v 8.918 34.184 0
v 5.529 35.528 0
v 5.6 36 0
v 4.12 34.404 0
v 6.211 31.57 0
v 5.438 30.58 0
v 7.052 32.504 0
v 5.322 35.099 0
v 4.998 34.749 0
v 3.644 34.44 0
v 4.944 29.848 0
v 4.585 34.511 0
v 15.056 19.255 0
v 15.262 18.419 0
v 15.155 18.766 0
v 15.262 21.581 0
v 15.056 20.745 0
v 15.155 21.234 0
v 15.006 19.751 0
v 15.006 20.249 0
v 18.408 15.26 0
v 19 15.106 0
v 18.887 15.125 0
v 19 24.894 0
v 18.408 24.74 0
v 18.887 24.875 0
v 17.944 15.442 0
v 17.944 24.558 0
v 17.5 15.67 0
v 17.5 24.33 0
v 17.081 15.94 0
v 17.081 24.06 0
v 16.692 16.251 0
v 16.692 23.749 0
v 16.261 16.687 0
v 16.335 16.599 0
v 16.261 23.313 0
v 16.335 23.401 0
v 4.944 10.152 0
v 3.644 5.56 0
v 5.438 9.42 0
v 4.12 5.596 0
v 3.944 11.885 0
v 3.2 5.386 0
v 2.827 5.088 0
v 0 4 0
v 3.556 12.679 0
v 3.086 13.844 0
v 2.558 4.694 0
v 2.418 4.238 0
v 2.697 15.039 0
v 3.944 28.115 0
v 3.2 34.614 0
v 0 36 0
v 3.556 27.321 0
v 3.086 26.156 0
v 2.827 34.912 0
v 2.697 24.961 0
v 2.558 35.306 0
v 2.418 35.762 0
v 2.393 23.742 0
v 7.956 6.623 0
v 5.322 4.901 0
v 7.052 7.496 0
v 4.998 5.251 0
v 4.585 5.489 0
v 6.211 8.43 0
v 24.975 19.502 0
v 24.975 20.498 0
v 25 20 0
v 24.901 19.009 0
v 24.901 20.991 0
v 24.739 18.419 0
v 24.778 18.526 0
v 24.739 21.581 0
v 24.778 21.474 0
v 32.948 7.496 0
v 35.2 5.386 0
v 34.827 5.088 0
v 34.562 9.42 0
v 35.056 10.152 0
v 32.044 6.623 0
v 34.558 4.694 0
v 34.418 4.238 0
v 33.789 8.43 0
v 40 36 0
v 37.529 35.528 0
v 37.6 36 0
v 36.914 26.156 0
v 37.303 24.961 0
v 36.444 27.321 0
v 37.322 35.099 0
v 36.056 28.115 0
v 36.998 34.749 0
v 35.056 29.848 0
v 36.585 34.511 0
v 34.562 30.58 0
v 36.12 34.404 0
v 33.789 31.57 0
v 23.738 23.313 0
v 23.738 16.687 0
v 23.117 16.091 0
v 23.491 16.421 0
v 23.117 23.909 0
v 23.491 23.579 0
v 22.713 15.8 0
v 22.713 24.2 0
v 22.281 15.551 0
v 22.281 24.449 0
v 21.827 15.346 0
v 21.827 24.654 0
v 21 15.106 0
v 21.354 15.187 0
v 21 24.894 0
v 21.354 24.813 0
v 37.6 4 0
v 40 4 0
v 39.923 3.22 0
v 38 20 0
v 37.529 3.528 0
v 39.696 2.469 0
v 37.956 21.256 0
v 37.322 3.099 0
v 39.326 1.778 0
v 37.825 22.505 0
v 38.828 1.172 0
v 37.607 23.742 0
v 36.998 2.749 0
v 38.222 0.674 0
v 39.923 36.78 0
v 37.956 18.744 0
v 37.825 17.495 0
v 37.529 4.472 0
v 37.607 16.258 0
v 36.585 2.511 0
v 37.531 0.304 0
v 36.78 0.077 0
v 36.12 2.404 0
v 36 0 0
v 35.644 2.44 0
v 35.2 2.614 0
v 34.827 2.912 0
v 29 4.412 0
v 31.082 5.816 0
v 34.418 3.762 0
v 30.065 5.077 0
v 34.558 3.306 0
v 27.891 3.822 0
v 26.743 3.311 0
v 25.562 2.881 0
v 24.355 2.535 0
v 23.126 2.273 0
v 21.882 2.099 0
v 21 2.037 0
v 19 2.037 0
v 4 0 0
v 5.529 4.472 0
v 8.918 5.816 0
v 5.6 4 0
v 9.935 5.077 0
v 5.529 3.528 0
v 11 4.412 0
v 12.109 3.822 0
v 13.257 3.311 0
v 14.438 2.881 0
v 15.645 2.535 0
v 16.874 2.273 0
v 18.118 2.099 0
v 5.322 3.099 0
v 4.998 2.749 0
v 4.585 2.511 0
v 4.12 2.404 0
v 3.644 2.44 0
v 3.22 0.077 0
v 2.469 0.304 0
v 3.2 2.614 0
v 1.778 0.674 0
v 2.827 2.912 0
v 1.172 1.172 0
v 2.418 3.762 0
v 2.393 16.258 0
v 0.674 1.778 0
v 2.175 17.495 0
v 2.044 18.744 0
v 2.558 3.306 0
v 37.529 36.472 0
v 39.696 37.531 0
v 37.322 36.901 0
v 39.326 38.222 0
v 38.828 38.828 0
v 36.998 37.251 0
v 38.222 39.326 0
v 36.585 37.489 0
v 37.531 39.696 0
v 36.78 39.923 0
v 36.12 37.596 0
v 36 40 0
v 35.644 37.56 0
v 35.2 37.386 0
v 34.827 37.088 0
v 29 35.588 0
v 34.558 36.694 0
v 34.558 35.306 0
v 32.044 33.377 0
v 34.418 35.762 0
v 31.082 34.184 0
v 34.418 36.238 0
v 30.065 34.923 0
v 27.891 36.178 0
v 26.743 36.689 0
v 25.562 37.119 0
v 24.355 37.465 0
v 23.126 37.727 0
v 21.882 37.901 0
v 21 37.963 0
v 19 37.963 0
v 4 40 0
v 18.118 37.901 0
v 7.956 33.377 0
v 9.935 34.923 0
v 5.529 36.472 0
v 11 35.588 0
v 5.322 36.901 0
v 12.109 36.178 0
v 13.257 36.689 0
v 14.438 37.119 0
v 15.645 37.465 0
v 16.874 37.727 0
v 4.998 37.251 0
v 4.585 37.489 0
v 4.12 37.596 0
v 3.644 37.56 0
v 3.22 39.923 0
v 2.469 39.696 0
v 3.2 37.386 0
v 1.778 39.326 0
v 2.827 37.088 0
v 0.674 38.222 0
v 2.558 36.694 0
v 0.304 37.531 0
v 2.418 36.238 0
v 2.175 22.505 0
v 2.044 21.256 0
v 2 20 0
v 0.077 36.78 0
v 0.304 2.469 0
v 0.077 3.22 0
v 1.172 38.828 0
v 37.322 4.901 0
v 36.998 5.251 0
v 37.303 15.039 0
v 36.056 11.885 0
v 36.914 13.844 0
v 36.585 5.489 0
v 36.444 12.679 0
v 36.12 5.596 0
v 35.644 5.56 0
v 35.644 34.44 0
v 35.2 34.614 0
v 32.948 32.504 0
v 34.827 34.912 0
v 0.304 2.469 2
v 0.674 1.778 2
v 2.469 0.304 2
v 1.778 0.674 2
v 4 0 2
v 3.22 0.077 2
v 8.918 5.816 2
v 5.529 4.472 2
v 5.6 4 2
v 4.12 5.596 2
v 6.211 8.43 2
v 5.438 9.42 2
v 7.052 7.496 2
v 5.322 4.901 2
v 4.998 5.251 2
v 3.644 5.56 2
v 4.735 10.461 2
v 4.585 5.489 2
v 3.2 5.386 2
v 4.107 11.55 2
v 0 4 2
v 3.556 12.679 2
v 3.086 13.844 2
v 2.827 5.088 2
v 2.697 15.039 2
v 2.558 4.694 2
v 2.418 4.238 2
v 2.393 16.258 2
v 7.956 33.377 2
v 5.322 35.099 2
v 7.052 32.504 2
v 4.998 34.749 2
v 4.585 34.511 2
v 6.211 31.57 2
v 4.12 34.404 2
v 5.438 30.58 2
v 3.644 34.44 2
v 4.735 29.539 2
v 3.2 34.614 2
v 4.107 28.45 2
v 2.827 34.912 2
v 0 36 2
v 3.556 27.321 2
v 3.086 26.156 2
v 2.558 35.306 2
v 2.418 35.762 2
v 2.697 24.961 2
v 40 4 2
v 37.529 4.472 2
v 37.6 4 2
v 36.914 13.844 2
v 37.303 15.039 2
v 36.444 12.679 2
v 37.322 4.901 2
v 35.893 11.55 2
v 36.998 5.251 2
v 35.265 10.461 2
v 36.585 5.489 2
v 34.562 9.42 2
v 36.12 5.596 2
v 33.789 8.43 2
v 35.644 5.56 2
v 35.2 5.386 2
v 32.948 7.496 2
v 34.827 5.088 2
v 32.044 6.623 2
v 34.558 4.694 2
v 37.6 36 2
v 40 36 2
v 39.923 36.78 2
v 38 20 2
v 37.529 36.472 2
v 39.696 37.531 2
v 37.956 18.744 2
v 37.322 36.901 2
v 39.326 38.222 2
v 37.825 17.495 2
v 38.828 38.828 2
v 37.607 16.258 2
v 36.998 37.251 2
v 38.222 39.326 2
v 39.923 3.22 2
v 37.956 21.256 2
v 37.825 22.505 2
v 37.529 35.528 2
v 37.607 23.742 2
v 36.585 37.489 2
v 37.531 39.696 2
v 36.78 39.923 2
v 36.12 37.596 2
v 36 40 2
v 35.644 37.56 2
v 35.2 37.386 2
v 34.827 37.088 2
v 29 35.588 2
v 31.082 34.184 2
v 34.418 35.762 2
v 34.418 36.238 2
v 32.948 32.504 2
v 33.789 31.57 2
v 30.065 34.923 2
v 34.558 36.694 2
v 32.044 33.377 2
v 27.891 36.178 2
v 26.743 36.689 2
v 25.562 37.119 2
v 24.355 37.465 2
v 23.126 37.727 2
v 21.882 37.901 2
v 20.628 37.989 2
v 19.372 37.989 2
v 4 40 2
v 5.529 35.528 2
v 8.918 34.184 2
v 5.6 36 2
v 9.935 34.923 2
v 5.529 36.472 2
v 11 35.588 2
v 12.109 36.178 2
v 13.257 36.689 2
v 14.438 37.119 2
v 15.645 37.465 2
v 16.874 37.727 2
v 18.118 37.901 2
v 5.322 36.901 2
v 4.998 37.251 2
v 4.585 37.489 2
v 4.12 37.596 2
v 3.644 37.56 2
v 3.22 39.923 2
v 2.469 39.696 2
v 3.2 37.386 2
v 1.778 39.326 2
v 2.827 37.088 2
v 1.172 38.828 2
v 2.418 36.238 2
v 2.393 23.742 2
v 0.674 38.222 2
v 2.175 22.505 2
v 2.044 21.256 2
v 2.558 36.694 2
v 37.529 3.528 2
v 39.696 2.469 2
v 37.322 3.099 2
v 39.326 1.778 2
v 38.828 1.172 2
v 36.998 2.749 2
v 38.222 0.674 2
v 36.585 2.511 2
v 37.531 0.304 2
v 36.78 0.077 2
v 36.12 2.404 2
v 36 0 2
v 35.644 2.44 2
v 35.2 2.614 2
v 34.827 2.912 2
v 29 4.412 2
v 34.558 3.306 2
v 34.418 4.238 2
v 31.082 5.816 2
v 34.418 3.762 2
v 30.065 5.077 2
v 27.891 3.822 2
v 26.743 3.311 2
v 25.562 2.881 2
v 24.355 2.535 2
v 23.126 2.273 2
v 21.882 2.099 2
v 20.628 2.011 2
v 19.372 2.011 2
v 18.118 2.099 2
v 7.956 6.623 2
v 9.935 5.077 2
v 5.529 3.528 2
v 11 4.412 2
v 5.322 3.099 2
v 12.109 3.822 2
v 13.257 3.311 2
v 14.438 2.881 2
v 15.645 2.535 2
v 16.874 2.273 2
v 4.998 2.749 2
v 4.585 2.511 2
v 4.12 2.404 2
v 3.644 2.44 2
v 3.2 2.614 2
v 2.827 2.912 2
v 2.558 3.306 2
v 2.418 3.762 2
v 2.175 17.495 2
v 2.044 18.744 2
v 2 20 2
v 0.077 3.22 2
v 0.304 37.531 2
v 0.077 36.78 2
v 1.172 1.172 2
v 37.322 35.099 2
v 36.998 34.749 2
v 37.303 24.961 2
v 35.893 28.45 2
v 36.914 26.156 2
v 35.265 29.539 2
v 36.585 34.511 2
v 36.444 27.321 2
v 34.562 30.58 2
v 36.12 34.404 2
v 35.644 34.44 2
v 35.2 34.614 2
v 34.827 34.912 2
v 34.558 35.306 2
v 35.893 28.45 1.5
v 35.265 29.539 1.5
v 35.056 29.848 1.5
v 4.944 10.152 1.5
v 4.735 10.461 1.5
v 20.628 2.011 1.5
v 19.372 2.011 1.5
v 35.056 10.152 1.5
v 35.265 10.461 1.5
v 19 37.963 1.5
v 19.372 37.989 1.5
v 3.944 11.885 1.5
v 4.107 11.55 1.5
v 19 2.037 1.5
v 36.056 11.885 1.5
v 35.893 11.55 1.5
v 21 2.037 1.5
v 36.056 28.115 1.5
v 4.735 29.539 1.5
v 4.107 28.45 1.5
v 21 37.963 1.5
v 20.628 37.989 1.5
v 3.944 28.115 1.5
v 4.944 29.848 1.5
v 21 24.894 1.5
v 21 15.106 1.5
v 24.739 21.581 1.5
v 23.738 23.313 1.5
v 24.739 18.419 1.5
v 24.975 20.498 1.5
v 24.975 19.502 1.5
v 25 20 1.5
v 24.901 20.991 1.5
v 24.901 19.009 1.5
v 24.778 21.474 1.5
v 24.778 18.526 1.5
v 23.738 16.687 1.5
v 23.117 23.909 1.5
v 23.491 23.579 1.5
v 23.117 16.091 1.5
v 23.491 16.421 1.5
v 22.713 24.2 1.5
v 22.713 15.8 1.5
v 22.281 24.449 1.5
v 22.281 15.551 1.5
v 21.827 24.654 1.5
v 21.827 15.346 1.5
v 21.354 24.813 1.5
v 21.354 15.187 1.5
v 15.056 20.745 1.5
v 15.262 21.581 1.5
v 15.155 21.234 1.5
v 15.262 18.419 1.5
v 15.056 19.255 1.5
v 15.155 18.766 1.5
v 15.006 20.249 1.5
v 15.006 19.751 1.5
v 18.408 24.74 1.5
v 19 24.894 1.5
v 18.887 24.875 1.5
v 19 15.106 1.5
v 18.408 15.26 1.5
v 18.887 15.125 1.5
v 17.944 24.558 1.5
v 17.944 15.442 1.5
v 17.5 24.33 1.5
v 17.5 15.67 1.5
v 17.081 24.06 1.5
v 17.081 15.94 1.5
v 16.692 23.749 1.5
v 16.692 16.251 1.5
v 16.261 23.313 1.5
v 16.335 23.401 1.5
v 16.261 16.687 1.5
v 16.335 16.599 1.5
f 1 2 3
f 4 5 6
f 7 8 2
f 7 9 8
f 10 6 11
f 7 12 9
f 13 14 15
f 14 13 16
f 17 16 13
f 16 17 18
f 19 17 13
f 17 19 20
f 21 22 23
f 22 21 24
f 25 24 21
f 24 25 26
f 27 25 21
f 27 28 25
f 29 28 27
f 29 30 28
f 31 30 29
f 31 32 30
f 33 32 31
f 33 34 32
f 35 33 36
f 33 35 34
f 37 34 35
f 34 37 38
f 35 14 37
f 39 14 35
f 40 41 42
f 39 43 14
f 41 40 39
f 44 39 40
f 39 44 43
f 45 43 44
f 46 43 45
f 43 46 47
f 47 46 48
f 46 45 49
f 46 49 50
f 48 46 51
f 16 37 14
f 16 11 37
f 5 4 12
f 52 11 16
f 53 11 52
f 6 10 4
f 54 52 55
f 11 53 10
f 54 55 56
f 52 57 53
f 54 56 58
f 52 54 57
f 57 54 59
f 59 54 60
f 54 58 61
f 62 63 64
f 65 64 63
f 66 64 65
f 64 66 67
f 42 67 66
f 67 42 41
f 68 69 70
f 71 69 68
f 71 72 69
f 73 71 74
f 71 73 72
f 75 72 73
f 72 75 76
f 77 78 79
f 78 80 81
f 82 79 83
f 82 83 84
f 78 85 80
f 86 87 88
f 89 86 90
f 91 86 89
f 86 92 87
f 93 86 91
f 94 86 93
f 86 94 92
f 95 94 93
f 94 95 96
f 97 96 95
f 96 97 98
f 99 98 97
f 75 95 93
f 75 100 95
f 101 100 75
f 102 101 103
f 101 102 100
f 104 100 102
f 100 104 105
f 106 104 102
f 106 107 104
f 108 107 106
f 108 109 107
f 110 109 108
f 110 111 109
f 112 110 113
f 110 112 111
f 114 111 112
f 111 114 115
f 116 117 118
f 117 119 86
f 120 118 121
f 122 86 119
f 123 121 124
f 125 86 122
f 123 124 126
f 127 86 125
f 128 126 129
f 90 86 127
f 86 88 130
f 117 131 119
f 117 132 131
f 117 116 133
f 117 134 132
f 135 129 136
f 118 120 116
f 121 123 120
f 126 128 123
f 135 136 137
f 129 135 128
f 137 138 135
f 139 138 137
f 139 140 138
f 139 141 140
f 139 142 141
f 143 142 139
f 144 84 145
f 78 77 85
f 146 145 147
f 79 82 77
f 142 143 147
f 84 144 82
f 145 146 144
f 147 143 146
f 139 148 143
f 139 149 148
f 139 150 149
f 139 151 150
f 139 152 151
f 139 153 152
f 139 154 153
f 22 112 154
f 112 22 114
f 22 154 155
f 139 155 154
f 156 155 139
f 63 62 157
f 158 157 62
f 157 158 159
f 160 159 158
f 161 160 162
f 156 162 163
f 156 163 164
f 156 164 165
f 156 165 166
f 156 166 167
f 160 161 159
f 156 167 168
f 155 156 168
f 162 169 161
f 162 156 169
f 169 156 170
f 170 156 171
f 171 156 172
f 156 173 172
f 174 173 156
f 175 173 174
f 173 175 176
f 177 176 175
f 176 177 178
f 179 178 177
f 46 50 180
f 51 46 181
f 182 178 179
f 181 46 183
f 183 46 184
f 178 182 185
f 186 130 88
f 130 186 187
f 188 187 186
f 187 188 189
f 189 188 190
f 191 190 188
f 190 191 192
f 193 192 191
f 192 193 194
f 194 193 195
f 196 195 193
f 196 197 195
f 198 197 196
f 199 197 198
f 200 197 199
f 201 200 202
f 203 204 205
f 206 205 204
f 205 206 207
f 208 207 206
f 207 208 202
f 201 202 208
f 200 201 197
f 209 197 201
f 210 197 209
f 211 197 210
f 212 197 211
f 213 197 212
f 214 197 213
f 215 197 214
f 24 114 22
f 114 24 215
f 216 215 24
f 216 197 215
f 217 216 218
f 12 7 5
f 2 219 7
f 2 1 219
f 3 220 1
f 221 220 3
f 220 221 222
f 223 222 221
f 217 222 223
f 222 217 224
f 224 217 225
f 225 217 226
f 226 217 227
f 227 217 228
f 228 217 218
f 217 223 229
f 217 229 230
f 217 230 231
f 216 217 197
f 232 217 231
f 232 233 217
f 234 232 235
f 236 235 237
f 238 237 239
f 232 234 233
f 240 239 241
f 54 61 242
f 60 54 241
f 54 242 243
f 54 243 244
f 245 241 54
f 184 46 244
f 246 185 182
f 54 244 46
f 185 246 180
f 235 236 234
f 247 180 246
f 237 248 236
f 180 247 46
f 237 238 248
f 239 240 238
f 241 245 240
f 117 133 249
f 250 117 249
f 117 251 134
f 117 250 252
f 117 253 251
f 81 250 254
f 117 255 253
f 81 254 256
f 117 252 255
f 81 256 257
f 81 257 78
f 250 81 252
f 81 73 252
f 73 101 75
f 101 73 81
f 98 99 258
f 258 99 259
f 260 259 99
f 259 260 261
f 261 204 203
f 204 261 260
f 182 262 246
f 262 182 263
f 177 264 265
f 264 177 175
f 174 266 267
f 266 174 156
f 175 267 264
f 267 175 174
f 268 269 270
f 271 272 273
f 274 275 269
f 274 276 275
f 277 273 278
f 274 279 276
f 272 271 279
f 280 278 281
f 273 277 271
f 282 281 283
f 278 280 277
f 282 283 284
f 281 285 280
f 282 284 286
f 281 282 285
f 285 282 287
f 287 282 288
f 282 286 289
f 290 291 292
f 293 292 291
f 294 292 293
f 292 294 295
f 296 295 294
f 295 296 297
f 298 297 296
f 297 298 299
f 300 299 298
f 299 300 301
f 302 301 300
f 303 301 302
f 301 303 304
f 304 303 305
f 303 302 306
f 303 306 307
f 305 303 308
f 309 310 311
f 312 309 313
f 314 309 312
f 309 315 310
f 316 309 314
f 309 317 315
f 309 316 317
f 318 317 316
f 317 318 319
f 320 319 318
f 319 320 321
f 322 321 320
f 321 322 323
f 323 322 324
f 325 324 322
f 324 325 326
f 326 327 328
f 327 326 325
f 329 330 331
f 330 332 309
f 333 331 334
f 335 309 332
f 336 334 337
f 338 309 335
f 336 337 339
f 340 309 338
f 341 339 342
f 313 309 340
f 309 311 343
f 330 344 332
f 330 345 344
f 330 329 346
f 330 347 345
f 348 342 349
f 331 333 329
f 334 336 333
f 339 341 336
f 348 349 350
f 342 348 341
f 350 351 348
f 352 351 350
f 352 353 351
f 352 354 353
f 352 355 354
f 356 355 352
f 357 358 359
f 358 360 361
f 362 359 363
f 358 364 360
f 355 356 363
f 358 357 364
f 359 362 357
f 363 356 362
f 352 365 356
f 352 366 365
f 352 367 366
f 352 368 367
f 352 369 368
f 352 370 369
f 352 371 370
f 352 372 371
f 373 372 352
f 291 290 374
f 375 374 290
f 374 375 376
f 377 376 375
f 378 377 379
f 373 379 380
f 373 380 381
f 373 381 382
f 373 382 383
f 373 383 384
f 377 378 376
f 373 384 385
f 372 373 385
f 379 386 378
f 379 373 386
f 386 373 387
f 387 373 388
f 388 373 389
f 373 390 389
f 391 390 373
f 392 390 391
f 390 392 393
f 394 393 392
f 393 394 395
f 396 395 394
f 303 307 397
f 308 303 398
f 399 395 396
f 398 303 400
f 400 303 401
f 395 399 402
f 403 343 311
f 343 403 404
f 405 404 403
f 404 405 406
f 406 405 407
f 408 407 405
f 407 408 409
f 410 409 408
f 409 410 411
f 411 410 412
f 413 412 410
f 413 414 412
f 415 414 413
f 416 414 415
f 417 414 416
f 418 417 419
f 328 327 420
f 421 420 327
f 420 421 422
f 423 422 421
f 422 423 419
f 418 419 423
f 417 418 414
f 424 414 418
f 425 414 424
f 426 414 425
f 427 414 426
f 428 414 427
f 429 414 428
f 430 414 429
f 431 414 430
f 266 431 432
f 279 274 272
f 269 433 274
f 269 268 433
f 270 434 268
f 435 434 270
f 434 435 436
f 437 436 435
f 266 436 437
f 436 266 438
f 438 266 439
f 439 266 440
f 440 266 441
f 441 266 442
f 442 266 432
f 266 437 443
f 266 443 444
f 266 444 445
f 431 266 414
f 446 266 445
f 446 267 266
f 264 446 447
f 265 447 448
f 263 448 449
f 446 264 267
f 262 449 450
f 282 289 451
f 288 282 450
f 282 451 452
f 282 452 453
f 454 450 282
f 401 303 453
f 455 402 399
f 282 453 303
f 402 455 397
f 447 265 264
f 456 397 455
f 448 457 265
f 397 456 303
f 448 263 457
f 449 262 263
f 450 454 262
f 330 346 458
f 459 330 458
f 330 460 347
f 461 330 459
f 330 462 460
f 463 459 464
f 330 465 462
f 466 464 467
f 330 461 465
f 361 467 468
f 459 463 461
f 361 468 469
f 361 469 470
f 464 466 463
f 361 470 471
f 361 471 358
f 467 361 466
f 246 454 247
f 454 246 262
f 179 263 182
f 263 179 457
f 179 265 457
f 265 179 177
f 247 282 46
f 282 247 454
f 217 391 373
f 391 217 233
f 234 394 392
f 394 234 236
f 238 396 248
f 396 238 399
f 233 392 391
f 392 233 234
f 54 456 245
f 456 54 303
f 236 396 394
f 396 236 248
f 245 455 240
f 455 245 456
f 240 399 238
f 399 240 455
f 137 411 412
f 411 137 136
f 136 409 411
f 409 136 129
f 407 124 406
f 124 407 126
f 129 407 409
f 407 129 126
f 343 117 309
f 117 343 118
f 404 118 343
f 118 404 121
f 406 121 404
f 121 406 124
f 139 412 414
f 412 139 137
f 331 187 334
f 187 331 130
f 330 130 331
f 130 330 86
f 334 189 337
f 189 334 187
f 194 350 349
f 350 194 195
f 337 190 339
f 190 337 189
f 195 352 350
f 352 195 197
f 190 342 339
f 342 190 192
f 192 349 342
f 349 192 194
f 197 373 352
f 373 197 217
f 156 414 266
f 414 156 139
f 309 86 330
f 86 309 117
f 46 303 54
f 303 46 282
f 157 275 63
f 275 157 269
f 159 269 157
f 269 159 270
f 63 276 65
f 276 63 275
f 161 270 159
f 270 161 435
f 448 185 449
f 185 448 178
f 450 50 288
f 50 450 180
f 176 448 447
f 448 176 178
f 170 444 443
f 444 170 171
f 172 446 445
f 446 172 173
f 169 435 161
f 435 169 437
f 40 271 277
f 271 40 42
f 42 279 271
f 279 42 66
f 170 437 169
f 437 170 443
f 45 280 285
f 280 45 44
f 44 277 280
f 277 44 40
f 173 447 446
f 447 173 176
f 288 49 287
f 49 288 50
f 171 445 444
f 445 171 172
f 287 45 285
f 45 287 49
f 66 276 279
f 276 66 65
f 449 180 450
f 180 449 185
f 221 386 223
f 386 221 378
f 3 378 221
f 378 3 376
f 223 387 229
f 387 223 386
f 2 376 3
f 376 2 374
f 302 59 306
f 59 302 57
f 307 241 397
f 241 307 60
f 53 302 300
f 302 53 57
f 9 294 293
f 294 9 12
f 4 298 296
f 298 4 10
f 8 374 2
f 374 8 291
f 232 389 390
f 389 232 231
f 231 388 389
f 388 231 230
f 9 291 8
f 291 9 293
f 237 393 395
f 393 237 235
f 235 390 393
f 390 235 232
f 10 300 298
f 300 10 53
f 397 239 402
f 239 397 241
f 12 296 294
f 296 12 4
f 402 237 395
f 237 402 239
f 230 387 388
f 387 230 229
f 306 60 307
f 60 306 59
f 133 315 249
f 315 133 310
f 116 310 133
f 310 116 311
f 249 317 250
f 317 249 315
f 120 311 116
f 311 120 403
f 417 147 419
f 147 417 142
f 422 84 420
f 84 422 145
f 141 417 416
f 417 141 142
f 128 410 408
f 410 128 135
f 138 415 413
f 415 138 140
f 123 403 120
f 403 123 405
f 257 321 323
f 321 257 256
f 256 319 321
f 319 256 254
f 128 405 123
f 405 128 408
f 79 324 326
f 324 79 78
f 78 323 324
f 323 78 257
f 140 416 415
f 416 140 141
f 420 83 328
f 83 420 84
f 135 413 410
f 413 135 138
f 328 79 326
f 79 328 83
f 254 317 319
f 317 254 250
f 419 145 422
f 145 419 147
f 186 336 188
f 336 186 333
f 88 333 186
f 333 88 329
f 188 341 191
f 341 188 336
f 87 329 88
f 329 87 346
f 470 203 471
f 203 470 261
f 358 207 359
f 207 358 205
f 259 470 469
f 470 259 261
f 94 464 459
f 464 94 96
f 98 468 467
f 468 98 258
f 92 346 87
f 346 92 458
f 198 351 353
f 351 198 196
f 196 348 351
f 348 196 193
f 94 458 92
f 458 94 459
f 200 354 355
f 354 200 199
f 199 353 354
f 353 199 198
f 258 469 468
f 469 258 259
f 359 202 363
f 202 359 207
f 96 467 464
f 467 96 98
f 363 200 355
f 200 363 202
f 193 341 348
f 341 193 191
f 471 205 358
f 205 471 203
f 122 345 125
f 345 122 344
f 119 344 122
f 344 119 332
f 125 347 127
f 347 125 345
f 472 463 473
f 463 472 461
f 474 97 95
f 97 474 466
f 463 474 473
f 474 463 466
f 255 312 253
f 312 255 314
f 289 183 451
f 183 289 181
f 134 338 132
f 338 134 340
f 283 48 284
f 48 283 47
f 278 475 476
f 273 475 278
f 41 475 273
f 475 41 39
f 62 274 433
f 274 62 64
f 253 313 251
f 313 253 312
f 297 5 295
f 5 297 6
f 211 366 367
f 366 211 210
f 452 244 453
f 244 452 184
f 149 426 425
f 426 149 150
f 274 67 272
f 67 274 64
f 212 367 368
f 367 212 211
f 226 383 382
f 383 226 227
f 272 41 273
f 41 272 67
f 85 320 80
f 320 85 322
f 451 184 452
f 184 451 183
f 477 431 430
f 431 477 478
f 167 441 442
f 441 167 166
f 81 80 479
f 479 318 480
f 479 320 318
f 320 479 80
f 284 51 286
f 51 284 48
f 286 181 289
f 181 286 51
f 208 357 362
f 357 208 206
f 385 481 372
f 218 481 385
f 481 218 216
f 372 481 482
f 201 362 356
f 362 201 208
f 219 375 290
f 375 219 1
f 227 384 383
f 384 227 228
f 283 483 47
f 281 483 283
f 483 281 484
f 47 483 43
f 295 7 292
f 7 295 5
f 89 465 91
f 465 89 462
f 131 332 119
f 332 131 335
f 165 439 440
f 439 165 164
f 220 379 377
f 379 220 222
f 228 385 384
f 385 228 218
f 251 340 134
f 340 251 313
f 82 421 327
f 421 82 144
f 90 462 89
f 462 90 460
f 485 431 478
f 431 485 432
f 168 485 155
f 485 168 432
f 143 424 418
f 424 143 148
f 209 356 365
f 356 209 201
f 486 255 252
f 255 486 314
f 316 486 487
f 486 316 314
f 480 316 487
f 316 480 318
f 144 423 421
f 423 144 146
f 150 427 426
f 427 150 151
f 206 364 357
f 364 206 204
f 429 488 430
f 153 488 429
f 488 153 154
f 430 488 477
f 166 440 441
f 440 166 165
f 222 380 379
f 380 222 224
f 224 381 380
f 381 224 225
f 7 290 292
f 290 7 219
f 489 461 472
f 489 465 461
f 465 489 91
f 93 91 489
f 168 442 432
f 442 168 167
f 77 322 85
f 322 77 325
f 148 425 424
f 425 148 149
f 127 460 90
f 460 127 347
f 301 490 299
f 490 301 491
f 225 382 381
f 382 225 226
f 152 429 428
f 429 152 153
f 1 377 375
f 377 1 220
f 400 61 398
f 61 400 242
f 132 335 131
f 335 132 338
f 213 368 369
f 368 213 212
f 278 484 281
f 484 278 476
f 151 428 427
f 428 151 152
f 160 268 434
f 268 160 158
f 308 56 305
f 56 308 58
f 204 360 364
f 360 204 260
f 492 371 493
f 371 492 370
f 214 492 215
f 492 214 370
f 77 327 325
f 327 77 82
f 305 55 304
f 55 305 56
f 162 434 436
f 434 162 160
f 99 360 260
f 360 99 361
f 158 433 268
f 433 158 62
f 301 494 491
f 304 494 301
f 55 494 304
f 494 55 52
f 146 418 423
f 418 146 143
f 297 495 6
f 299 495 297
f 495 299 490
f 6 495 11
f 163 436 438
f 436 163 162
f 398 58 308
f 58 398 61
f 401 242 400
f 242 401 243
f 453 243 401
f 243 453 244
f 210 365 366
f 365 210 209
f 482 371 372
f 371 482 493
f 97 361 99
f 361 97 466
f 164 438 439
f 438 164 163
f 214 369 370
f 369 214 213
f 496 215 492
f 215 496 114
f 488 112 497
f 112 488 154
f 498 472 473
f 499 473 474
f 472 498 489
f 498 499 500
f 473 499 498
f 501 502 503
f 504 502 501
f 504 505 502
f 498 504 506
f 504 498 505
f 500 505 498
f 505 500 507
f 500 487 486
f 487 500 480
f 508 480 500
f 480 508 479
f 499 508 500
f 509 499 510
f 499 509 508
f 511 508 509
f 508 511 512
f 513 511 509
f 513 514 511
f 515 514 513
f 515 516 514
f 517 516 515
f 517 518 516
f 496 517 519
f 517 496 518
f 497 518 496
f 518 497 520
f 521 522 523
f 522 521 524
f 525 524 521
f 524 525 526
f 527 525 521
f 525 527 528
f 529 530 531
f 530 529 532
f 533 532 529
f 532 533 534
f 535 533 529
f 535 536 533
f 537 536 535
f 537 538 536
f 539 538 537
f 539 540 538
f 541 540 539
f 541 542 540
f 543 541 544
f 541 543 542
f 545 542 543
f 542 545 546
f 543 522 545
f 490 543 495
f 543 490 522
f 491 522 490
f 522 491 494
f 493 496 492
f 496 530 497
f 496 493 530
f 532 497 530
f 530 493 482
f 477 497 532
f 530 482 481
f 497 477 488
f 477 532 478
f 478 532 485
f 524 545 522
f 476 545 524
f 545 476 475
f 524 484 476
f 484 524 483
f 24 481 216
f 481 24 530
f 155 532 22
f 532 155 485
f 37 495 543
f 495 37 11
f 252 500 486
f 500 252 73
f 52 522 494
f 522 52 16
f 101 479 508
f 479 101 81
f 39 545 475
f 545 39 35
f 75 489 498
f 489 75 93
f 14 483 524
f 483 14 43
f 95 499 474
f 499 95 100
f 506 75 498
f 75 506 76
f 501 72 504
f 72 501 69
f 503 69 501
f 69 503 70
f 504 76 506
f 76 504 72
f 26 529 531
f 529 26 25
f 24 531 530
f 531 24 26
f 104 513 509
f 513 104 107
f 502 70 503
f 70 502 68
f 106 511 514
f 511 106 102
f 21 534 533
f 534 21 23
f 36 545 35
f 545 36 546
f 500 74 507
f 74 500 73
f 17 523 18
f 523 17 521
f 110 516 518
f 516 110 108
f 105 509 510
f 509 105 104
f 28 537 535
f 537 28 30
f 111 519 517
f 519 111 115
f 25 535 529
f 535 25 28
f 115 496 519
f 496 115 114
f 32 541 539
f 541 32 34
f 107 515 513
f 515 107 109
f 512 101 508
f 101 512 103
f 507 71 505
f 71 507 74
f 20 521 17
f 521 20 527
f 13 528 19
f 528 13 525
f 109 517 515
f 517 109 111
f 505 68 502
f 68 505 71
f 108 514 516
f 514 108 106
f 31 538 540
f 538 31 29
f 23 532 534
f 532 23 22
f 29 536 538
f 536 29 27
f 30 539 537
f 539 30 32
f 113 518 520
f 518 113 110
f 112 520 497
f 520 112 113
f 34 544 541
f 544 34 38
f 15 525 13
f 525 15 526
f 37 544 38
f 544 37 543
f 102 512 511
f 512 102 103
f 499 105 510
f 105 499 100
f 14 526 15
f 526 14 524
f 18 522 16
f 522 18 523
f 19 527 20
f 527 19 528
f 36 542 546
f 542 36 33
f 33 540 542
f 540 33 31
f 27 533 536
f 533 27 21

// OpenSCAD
// Size of the fan, in mm
fansize = 40;
// Offset of the screws from the edge of the fan
screwoffset = 4;
// Size of the screw holes
screwsize = 3;

// Modules imported from mlib.scad
module mroundcube(d, r = 1, center = false)
{
    trn = center ? [-d[0]/2, -d[1]/2, -d[2]/2] : [0,0,0];
    translate(trn) union() {
        for(i=[r,d[0]-r])
            for(j=[r,d[1]-r])
                translate([i, j, 0]) cylinder(r=r, h=d[2], $fn=32);
        translate([r, 0, 0]) cube([d[0] - 2 * r, d[1], d[2]]);
        translate([0, r, 0]) cube([d[0], d[1] - 2 * r, d[2]]);
    }
}

$fs = 0.5;
$fa = 4;

difference() {
    mroundcube([fansize, fansize, 2], screwoffset);
    screws=[screwoffset, fansize-screwoffset];
    for(x=screws) for(y=screws) {
        translate([x, y, -1]) cylinder(r=screwsize/2+0.1, h=10);
    }
    translate([fansize/2, fansize/2, -1]) cylinder(r=fansize/2-2, h=10);
}

translate([fansize/2, fansize/2, 0]) cylinder(r=fansize/8, h=1.5);

for(i=[0, 60, 120]) {
    translate([fansize/2, fansize/2, .75]) rotate([0, 0, i]) cube([fansize / 20, fansize-2, 1.5], center=true);
}
